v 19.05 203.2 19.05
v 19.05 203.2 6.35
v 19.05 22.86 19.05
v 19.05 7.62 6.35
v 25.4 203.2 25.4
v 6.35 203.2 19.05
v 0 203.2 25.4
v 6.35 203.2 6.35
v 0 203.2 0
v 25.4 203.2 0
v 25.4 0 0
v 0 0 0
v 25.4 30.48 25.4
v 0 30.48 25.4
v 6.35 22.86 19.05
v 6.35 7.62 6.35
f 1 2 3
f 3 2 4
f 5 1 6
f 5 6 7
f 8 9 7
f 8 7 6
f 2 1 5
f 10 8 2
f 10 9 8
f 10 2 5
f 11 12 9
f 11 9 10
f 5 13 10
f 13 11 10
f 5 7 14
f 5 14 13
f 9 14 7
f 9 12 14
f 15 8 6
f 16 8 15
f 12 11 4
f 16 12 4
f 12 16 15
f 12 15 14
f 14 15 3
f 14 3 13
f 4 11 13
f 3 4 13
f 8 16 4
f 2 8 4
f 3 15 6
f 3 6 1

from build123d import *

# Parameters (mm, degrees)
SKETCH2_W           = 25.4
SKETCH2_H           = 203.2
BOSS_EXTRUDE2_DEPTH = 25.4
SKETCH3_W           = 12.7
SKETCH3_H           = 12.7
CUT_EXTRUDE1_DEPTH  = 207.350575478
CUT_EXTRUDE2_DEPTH  = 207.350575478


with BuildPart() as part:
    # Sketch2 → Boss-Extrude2 (new body)
    with BuildSketch(Plane.XY):
        with Locations((12.7, 101.6)):
            Rectangle(SKETCH2_W, SKETCH2_H)
    extrude(amount=BOSS_EXTRUDE2_DEPTH)

    # Sketch3 → Cut-Extrude1 (cut, through all)
    with BuildSketch(Plane.XZ):
        with Locations((12.7, 12.7)):
            Rectangle(SKETCH3_W, SKETCH3_H)
    extrude(amount=-CUT_EXTRUDE1_DEPTH, mode=Mode.SUBTRACT)

    # Sketch4 → Cut-Extrude2 (cut, through all)
    with BuildSketch(Plane(origin=(25.4, 0, 0), x_dir=(0, 0, -1), z_dir=(1, 0, 0))):
        Polygon((0, 0), (-25.4, 30.48), (-25.4, 0), align=None)
    extrude(amount=-CUT_EXTRUDE2_DEPTH, mode=Mode.SUBTRACT)


solid = part.part
